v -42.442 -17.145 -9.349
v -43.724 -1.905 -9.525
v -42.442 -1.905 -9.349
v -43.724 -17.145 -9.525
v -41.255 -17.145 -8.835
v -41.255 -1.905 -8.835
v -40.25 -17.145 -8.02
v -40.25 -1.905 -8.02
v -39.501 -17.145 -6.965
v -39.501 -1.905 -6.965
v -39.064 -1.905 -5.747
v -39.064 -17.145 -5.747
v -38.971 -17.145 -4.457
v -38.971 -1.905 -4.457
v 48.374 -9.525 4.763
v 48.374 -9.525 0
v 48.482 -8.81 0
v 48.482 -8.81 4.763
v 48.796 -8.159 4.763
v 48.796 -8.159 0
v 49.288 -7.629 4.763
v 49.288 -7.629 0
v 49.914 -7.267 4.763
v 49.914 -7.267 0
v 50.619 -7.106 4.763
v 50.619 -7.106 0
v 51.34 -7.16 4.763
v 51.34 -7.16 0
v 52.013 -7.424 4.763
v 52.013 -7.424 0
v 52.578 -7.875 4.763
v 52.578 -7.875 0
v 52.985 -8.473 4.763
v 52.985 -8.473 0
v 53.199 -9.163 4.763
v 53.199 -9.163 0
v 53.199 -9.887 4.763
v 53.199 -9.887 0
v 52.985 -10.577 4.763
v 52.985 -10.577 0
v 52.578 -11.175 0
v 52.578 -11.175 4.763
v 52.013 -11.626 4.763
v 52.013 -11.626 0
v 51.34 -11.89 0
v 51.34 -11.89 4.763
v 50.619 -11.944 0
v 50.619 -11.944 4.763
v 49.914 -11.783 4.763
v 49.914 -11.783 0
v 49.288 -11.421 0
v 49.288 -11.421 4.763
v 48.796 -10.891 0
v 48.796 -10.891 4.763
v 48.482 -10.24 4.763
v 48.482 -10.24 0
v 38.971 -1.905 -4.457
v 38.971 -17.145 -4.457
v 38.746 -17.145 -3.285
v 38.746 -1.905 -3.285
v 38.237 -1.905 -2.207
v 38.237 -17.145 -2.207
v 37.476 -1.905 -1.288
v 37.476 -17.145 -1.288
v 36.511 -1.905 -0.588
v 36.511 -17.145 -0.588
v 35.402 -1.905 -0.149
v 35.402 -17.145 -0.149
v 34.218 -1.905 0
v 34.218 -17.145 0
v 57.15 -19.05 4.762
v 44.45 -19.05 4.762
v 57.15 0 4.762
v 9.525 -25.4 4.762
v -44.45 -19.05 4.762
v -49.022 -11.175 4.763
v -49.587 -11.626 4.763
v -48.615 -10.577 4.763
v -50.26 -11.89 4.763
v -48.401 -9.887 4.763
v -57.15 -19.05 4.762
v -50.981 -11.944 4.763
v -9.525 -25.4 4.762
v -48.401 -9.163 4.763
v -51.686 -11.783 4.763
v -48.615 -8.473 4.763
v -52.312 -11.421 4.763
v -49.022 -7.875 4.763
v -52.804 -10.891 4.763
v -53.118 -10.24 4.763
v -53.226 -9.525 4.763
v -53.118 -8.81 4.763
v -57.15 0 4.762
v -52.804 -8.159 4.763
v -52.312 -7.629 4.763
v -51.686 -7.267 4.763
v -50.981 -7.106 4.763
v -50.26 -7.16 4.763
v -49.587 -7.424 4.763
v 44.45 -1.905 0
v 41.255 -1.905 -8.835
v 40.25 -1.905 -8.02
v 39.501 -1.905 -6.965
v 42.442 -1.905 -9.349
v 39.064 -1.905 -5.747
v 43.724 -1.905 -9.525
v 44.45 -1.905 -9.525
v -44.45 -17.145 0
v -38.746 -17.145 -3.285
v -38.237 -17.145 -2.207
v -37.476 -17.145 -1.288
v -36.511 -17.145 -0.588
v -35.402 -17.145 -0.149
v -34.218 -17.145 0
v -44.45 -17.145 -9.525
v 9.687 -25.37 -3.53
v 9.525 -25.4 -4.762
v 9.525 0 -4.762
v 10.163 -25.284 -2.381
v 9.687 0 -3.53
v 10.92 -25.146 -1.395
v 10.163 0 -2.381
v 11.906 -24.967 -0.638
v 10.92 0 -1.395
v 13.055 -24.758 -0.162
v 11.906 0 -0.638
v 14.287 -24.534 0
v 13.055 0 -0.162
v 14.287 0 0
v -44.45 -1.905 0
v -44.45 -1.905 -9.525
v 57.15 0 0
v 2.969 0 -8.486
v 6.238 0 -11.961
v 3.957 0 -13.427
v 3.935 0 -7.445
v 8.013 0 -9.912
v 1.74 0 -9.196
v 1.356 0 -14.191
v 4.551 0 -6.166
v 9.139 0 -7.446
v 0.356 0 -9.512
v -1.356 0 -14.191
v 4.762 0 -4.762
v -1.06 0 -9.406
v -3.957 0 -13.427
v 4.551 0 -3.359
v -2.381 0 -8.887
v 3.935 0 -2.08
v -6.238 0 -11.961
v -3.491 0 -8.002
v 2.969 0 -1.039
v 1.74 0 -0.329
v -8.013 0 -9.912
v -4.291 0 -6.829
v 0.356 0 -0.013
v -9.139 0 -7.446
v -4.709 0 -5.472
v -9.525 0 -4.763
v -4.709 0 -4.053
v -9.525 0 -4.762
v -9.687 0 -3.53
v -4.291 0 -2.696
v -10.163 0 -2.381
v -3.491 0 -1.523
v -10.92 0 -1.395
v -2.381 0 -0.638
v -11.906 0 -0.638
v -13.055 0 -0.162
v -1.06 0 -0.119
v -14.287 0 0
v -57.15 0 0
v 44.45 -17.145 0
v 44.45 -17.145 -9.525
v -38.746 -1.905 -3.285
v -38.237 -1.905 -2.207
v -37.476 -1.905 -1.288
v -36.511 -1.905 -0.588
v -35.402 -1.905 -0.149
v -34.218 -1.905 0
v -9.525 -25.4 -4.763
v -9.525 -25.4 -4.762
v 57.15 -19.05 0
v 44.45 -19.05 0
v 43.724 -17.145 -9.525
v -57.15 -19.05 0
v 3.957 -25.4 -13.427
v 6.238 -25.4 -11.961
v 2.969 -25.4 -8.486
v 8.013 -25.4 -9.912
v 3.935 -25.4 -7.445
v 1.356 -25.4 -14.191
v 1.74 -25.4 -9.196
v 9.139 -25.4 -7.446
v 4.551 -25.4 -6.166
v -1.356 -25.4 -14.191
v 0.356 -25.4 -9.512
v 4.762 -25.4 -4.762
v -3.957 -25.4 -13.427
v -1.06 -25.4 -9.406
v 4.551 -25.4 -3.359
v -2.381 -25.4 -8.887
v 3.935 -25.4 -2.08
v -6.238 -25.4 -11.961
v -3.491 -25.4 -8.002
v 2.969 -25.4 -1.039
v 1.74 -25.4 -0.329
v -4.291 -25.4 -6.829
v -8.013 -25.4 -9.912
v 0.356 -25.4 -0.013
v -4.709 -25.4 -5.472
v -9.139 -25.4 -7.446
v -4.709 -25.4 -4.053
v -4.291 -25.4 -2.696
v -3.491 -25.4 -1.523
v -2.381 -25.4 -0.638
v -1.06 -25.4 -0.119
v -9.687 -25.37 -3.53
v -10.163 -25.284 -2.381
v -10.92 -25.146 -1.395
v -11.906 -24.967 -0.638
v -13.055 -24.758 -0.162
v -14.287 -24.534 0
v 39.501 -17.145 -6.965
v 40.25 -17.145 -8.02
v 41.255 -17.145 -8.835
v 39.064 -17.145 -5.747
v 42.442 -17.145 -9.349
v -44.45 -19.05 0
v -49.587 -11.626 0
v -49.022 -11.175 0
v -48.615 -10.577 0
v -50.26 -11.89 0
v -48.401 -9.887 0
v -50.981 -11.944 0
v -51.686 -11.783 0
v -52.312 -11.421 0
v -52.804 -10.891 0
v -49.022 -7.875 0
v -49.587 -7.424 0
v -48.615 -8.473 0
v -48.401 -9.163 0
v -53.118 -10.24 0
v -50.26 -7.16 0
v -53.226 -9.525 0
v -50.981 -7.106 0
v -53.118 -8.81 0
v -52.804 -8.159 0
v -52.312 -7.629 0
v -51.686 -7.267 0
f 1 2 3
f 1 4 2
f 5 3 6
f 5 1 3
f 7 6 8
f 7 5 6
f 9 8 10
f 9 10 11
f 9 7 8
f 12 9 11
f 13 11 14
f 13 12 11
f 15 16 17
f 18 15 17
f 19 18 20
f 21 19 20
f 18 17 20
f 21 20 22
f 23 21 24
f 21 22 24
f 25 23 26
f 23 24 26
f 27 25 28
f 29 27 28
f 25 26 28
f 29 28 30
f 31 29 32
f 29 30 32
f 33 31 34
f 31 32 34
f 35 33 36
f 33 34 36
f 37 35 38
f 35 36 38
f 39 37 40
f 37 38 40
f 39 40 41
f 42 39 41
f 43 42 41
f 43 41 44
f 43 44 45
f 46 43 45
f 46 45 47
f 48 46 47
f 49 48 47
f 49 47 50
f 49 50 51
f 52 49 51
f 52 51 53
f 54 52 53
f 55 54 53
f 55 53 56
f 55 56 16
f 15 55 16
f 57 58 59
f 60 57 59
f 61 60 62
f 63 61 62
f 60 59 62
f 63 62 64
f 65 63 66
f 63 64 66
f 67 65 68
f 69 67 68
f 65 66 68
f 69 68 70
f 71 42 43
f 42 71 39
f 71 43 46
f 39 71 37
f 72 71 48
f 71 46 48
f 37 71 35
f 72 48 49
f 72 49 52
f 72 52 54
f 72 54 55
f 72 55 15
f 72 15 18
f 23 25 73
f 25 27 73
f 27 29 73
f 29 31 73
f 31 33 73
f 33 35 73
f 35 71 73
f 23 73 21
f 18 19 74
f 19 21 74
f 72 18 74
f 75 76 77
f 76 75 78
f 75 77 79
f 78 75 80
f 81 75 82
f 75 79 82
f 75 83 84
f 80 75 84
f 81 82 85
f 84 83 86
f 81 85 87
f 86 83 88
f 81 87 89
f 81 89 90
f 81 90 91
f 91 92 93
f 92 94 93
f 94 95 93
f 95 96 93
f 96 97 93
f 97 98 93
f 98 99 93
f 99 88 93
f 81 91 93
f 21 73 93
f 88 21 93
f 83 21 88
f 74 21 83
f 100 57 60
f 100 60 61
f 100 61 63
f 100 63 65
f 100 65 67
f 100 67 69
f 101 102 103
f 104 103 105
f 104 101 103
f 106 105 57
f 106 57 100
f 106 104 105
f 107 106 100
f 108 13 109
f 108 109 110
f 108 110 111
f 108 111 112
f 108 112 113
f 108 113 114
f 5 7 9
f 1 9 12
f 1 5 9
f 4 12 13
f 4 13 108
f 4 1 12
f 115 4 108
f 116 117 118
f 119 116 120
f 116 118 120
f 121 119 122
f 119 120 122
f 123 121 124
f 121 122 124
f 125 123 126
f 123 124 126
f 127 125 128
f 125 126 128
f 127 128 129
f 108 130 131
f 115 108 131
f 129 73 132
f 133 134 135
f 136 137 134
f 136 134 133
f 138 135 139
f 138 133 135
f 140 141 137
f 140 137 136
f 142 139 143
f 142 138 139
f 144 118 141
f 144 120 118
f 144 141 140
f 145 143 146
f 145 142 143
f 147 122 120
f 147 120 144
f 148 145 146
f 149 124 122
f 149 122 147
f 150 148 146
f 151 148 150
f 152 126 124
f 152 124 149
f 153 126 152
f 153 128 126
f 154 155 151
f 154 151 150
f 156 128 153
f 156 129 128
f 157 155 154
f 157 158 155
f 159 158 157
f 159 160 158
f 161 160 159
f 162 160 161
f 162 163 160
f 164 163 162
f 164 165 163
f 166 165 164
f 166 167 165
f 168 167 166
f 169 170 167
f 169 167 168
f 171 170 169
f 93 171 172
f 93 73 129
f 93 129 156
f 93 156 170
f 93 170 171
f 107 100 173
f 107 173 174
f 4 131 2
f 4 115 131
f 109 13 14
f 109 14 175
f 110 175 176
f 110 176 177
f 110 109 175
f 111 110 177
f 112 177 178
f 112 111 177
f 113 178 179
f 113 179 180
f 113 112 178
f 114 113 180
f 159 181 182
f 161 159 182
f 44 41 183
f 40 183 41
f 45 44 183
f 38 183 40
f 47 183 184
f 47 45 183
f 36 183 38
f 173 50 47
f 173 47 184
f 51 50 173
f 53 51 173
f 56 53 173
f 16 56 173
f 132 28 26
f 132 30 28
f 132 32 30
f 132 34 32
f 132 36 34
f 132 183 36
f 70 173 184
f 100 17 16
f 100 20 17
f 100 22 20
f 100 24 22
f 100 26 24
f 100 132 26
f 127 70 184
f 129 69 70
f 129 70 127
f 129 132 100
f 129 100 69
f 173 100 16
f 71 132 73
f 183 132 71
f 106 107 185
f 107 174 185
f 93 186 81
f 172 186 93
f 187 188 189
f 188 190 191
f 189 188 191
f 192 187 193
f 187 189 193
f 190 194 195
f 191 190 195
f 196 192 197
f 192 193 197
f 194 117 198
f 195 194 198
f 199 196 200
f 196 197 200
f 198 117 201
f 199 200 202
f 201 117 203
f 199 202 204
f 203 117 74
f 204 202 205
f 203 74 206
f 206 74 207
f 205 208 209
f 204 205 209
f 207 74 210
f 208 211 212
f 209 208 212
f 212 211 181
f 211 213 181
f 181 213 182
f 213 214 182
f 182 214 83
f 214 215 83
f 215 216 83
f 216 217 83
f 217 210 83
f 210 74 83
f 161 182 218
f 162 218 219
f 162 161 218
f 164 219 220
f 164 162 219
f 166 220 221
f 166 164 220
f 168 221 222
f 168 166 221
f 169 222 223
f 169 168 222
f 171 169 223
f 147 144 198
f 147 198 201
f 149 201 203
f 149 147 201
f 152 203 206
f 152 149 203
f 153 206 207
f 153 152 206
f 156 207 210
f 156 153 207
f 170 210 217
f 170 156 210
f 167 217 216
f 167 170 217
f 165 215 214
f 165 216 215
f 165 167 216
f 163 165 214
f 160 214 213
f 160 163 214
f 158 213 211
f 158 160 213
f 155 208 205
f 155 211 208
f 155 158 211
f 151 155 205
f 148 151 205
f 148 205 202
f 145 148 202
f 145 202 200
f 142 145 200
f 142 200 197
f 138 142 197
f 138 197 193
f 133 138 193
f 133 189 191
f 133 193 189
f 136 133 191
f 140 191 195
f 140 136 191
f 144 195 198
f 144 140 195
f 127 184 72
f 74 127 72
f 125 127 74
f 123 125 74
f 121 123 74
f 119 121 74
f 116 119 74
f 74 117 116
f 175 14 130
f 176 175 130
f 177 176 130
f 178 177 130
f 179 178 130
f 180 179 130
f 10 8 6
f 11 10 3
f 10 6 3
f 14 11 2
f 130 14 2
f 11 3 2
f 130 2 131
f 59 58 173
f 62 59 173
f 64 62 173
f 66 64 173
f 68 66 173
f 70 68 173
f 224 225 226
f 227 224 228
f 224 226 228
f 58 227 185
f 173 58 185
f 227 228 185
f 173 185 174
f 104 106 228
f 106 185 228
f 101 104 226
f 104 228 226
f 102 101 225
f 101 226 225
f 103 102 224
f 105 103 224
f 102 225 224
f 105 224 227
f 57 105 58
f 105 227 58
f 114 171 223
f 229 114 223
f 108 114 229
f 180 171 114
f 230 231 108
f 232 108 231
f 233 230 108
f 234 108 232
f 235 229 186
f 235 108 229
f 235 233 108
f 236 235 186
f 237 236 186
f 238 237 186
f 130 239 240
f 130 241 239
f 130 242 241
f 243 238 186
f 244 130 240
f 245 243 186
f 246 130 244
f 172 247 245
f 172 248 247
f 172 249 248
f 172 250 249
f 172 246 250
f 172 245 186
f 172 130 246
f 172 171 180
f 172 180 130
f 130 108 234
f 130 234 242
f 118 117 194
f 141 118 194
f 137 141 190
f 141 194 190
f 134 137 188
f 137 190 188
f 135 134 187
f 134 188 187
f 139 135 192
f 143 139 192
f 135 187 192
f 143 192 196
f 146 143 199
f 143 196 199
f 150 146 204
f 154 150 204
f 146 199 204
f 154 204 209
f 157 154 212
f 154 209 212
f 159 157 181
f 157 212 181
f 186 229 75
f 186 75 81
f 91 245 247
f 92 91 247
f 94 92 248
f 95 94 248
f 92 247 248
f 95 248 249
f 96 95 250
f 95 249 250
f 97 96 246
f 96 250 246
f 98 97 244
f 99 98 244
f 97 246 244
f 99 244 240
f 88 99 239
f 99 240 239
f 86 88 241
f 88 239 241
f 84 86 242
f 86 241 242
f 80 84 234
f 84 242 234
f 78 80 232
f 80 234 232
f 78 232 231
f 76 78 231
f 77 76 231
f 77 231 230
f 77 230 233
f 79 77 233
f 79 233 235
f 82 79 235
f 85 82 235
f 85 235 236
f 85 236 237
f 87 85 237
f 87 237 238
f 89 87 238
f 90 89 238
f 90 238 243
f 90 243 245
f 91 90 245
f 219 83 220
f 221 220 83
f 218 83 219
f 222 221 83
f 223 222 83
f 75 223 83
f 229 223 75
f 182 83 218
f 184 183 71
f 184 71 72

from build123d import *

# Parameters (mm, degrees)
BOSS_EXTRUDE5_DEPTH         = 4.7625
F_11_0_191_DIAMETER_HOLE1_D = 4.8514
BOSS_EXTRUDE6_DEPTH         = 25.4
CUT_EXTRUDE1_DEPTH          = 65.15150159
CUT_EXTRUDE1_DEPTH_BACK     = 65.15150159
SKETCH7_R                   = 4.7625
FILLET2_R                   = 4.7625
BOSS_EXTRUDE7_DEPTH         = 7.62


with BuildPart() as part:
    # Sketch3 → Boss-Extrude5 (new body)
    with BuildSketch(Plane.XY):
        Polygon((-57.15, 0), (57.15, 0), (57.15, -19.05), (44.45, -19.05), (9.525, -25.4), (-9.525, -25.4), (-44.45, -19.05), (-57.15, -19.05), align=None)
    extrude(amount=BOSS_EXTRUDE5_DEPTH)

    # #11 (0.191) Diameter Hole1 (through all)
    with Locations(Plane(origin=(50.8, -9.525, 4.7625), x_dir=(1, 0, 0), z_dir=(0, 0, 1))):
        with Locations((0, 0), (-101.6, 0)):
            Hole(F_11_0_191_DIAMETER_HOLE1_D / 2)

    # Sketch6 → Boss-Extrude6 (add)
    with BuildSketch(Plane.XZ.offset(25.4)):
        with BuildLine():
            Line((9.525, 0), (9.525, -4.7625))
            ThreePointArc((9.525, -4.7625), (0, -14.2875), (-9.525, -4.7625))
            Line((-9.525, -4.7625), (-9.525, 0))
            Line((-9.525, 0), (9.525, 0))
        make_face()
    extrude(amount=-BOSS_EXTRUDE6_DEPTH)

    # Sketch7 → Cut-Extrude1 (cut, two sides: drawn at the far end of the back side and taken through both)
    with BuildSketch(Plane.XZ.offset(25.4).offset(-CUT_EXTRUDE1_DEPTH_BACK)):
        with Locations((0, -4.7625)):
            Circle(SKETCH7_R)
    extrude(amount=CUT_EXTRUDE1_DEPTH + CUT_EXTRUDE1_DEPTH_BACK, mode=Mode.SUBTRACT)

    # Fillet2
    fillet2_edges = [part.edges().sort_by_distance(p)[0] for p in [
        (-9.525, -12.7, 0),
        (9.525, -12.7, 0),
    ]]
    fillet(fillet2_edges, radius=FILLET2_R - 0.0001)  # a hair under: the kernel refuses the full size

    # Sketch8 → Boss-Extrude7 (add, symmetric)
    with BuildSketch(Plane(origin=(0, -9.525, 0), x_dir=(-1, 0, 0), z_dir=(0, -1, 0))):
        with BuildLine():
            Line((-44.45, 0), (-44.45, 9.525))
            Line((-44.45, 9.525), (-43.723723681, 9.525))
            ThreePointArc((-43.723723681, 9.525), (-40.249716578, 8.02021099), (-38.971047095, 4.45676888))
            ThreePointArc((-38.971047095, 4.45676888), (-37.476081499, 1.288492897), (-34.218370509, 0))
            Line((-34.218370509, 0), (-44.45, 0))
        make_face()
    boss_extrude7 = extrude(amount=BOSS_EXTRUDE7_DEPTH, both=True)

    # Mirror1: Boss-Extrude7 across plane
    add(boss_extrude7.mirror(Plane(origin=(0, 0, 0), x_dir=(0, 0, 1), z_dir=(1, 0, 0))))


solid = part.part
